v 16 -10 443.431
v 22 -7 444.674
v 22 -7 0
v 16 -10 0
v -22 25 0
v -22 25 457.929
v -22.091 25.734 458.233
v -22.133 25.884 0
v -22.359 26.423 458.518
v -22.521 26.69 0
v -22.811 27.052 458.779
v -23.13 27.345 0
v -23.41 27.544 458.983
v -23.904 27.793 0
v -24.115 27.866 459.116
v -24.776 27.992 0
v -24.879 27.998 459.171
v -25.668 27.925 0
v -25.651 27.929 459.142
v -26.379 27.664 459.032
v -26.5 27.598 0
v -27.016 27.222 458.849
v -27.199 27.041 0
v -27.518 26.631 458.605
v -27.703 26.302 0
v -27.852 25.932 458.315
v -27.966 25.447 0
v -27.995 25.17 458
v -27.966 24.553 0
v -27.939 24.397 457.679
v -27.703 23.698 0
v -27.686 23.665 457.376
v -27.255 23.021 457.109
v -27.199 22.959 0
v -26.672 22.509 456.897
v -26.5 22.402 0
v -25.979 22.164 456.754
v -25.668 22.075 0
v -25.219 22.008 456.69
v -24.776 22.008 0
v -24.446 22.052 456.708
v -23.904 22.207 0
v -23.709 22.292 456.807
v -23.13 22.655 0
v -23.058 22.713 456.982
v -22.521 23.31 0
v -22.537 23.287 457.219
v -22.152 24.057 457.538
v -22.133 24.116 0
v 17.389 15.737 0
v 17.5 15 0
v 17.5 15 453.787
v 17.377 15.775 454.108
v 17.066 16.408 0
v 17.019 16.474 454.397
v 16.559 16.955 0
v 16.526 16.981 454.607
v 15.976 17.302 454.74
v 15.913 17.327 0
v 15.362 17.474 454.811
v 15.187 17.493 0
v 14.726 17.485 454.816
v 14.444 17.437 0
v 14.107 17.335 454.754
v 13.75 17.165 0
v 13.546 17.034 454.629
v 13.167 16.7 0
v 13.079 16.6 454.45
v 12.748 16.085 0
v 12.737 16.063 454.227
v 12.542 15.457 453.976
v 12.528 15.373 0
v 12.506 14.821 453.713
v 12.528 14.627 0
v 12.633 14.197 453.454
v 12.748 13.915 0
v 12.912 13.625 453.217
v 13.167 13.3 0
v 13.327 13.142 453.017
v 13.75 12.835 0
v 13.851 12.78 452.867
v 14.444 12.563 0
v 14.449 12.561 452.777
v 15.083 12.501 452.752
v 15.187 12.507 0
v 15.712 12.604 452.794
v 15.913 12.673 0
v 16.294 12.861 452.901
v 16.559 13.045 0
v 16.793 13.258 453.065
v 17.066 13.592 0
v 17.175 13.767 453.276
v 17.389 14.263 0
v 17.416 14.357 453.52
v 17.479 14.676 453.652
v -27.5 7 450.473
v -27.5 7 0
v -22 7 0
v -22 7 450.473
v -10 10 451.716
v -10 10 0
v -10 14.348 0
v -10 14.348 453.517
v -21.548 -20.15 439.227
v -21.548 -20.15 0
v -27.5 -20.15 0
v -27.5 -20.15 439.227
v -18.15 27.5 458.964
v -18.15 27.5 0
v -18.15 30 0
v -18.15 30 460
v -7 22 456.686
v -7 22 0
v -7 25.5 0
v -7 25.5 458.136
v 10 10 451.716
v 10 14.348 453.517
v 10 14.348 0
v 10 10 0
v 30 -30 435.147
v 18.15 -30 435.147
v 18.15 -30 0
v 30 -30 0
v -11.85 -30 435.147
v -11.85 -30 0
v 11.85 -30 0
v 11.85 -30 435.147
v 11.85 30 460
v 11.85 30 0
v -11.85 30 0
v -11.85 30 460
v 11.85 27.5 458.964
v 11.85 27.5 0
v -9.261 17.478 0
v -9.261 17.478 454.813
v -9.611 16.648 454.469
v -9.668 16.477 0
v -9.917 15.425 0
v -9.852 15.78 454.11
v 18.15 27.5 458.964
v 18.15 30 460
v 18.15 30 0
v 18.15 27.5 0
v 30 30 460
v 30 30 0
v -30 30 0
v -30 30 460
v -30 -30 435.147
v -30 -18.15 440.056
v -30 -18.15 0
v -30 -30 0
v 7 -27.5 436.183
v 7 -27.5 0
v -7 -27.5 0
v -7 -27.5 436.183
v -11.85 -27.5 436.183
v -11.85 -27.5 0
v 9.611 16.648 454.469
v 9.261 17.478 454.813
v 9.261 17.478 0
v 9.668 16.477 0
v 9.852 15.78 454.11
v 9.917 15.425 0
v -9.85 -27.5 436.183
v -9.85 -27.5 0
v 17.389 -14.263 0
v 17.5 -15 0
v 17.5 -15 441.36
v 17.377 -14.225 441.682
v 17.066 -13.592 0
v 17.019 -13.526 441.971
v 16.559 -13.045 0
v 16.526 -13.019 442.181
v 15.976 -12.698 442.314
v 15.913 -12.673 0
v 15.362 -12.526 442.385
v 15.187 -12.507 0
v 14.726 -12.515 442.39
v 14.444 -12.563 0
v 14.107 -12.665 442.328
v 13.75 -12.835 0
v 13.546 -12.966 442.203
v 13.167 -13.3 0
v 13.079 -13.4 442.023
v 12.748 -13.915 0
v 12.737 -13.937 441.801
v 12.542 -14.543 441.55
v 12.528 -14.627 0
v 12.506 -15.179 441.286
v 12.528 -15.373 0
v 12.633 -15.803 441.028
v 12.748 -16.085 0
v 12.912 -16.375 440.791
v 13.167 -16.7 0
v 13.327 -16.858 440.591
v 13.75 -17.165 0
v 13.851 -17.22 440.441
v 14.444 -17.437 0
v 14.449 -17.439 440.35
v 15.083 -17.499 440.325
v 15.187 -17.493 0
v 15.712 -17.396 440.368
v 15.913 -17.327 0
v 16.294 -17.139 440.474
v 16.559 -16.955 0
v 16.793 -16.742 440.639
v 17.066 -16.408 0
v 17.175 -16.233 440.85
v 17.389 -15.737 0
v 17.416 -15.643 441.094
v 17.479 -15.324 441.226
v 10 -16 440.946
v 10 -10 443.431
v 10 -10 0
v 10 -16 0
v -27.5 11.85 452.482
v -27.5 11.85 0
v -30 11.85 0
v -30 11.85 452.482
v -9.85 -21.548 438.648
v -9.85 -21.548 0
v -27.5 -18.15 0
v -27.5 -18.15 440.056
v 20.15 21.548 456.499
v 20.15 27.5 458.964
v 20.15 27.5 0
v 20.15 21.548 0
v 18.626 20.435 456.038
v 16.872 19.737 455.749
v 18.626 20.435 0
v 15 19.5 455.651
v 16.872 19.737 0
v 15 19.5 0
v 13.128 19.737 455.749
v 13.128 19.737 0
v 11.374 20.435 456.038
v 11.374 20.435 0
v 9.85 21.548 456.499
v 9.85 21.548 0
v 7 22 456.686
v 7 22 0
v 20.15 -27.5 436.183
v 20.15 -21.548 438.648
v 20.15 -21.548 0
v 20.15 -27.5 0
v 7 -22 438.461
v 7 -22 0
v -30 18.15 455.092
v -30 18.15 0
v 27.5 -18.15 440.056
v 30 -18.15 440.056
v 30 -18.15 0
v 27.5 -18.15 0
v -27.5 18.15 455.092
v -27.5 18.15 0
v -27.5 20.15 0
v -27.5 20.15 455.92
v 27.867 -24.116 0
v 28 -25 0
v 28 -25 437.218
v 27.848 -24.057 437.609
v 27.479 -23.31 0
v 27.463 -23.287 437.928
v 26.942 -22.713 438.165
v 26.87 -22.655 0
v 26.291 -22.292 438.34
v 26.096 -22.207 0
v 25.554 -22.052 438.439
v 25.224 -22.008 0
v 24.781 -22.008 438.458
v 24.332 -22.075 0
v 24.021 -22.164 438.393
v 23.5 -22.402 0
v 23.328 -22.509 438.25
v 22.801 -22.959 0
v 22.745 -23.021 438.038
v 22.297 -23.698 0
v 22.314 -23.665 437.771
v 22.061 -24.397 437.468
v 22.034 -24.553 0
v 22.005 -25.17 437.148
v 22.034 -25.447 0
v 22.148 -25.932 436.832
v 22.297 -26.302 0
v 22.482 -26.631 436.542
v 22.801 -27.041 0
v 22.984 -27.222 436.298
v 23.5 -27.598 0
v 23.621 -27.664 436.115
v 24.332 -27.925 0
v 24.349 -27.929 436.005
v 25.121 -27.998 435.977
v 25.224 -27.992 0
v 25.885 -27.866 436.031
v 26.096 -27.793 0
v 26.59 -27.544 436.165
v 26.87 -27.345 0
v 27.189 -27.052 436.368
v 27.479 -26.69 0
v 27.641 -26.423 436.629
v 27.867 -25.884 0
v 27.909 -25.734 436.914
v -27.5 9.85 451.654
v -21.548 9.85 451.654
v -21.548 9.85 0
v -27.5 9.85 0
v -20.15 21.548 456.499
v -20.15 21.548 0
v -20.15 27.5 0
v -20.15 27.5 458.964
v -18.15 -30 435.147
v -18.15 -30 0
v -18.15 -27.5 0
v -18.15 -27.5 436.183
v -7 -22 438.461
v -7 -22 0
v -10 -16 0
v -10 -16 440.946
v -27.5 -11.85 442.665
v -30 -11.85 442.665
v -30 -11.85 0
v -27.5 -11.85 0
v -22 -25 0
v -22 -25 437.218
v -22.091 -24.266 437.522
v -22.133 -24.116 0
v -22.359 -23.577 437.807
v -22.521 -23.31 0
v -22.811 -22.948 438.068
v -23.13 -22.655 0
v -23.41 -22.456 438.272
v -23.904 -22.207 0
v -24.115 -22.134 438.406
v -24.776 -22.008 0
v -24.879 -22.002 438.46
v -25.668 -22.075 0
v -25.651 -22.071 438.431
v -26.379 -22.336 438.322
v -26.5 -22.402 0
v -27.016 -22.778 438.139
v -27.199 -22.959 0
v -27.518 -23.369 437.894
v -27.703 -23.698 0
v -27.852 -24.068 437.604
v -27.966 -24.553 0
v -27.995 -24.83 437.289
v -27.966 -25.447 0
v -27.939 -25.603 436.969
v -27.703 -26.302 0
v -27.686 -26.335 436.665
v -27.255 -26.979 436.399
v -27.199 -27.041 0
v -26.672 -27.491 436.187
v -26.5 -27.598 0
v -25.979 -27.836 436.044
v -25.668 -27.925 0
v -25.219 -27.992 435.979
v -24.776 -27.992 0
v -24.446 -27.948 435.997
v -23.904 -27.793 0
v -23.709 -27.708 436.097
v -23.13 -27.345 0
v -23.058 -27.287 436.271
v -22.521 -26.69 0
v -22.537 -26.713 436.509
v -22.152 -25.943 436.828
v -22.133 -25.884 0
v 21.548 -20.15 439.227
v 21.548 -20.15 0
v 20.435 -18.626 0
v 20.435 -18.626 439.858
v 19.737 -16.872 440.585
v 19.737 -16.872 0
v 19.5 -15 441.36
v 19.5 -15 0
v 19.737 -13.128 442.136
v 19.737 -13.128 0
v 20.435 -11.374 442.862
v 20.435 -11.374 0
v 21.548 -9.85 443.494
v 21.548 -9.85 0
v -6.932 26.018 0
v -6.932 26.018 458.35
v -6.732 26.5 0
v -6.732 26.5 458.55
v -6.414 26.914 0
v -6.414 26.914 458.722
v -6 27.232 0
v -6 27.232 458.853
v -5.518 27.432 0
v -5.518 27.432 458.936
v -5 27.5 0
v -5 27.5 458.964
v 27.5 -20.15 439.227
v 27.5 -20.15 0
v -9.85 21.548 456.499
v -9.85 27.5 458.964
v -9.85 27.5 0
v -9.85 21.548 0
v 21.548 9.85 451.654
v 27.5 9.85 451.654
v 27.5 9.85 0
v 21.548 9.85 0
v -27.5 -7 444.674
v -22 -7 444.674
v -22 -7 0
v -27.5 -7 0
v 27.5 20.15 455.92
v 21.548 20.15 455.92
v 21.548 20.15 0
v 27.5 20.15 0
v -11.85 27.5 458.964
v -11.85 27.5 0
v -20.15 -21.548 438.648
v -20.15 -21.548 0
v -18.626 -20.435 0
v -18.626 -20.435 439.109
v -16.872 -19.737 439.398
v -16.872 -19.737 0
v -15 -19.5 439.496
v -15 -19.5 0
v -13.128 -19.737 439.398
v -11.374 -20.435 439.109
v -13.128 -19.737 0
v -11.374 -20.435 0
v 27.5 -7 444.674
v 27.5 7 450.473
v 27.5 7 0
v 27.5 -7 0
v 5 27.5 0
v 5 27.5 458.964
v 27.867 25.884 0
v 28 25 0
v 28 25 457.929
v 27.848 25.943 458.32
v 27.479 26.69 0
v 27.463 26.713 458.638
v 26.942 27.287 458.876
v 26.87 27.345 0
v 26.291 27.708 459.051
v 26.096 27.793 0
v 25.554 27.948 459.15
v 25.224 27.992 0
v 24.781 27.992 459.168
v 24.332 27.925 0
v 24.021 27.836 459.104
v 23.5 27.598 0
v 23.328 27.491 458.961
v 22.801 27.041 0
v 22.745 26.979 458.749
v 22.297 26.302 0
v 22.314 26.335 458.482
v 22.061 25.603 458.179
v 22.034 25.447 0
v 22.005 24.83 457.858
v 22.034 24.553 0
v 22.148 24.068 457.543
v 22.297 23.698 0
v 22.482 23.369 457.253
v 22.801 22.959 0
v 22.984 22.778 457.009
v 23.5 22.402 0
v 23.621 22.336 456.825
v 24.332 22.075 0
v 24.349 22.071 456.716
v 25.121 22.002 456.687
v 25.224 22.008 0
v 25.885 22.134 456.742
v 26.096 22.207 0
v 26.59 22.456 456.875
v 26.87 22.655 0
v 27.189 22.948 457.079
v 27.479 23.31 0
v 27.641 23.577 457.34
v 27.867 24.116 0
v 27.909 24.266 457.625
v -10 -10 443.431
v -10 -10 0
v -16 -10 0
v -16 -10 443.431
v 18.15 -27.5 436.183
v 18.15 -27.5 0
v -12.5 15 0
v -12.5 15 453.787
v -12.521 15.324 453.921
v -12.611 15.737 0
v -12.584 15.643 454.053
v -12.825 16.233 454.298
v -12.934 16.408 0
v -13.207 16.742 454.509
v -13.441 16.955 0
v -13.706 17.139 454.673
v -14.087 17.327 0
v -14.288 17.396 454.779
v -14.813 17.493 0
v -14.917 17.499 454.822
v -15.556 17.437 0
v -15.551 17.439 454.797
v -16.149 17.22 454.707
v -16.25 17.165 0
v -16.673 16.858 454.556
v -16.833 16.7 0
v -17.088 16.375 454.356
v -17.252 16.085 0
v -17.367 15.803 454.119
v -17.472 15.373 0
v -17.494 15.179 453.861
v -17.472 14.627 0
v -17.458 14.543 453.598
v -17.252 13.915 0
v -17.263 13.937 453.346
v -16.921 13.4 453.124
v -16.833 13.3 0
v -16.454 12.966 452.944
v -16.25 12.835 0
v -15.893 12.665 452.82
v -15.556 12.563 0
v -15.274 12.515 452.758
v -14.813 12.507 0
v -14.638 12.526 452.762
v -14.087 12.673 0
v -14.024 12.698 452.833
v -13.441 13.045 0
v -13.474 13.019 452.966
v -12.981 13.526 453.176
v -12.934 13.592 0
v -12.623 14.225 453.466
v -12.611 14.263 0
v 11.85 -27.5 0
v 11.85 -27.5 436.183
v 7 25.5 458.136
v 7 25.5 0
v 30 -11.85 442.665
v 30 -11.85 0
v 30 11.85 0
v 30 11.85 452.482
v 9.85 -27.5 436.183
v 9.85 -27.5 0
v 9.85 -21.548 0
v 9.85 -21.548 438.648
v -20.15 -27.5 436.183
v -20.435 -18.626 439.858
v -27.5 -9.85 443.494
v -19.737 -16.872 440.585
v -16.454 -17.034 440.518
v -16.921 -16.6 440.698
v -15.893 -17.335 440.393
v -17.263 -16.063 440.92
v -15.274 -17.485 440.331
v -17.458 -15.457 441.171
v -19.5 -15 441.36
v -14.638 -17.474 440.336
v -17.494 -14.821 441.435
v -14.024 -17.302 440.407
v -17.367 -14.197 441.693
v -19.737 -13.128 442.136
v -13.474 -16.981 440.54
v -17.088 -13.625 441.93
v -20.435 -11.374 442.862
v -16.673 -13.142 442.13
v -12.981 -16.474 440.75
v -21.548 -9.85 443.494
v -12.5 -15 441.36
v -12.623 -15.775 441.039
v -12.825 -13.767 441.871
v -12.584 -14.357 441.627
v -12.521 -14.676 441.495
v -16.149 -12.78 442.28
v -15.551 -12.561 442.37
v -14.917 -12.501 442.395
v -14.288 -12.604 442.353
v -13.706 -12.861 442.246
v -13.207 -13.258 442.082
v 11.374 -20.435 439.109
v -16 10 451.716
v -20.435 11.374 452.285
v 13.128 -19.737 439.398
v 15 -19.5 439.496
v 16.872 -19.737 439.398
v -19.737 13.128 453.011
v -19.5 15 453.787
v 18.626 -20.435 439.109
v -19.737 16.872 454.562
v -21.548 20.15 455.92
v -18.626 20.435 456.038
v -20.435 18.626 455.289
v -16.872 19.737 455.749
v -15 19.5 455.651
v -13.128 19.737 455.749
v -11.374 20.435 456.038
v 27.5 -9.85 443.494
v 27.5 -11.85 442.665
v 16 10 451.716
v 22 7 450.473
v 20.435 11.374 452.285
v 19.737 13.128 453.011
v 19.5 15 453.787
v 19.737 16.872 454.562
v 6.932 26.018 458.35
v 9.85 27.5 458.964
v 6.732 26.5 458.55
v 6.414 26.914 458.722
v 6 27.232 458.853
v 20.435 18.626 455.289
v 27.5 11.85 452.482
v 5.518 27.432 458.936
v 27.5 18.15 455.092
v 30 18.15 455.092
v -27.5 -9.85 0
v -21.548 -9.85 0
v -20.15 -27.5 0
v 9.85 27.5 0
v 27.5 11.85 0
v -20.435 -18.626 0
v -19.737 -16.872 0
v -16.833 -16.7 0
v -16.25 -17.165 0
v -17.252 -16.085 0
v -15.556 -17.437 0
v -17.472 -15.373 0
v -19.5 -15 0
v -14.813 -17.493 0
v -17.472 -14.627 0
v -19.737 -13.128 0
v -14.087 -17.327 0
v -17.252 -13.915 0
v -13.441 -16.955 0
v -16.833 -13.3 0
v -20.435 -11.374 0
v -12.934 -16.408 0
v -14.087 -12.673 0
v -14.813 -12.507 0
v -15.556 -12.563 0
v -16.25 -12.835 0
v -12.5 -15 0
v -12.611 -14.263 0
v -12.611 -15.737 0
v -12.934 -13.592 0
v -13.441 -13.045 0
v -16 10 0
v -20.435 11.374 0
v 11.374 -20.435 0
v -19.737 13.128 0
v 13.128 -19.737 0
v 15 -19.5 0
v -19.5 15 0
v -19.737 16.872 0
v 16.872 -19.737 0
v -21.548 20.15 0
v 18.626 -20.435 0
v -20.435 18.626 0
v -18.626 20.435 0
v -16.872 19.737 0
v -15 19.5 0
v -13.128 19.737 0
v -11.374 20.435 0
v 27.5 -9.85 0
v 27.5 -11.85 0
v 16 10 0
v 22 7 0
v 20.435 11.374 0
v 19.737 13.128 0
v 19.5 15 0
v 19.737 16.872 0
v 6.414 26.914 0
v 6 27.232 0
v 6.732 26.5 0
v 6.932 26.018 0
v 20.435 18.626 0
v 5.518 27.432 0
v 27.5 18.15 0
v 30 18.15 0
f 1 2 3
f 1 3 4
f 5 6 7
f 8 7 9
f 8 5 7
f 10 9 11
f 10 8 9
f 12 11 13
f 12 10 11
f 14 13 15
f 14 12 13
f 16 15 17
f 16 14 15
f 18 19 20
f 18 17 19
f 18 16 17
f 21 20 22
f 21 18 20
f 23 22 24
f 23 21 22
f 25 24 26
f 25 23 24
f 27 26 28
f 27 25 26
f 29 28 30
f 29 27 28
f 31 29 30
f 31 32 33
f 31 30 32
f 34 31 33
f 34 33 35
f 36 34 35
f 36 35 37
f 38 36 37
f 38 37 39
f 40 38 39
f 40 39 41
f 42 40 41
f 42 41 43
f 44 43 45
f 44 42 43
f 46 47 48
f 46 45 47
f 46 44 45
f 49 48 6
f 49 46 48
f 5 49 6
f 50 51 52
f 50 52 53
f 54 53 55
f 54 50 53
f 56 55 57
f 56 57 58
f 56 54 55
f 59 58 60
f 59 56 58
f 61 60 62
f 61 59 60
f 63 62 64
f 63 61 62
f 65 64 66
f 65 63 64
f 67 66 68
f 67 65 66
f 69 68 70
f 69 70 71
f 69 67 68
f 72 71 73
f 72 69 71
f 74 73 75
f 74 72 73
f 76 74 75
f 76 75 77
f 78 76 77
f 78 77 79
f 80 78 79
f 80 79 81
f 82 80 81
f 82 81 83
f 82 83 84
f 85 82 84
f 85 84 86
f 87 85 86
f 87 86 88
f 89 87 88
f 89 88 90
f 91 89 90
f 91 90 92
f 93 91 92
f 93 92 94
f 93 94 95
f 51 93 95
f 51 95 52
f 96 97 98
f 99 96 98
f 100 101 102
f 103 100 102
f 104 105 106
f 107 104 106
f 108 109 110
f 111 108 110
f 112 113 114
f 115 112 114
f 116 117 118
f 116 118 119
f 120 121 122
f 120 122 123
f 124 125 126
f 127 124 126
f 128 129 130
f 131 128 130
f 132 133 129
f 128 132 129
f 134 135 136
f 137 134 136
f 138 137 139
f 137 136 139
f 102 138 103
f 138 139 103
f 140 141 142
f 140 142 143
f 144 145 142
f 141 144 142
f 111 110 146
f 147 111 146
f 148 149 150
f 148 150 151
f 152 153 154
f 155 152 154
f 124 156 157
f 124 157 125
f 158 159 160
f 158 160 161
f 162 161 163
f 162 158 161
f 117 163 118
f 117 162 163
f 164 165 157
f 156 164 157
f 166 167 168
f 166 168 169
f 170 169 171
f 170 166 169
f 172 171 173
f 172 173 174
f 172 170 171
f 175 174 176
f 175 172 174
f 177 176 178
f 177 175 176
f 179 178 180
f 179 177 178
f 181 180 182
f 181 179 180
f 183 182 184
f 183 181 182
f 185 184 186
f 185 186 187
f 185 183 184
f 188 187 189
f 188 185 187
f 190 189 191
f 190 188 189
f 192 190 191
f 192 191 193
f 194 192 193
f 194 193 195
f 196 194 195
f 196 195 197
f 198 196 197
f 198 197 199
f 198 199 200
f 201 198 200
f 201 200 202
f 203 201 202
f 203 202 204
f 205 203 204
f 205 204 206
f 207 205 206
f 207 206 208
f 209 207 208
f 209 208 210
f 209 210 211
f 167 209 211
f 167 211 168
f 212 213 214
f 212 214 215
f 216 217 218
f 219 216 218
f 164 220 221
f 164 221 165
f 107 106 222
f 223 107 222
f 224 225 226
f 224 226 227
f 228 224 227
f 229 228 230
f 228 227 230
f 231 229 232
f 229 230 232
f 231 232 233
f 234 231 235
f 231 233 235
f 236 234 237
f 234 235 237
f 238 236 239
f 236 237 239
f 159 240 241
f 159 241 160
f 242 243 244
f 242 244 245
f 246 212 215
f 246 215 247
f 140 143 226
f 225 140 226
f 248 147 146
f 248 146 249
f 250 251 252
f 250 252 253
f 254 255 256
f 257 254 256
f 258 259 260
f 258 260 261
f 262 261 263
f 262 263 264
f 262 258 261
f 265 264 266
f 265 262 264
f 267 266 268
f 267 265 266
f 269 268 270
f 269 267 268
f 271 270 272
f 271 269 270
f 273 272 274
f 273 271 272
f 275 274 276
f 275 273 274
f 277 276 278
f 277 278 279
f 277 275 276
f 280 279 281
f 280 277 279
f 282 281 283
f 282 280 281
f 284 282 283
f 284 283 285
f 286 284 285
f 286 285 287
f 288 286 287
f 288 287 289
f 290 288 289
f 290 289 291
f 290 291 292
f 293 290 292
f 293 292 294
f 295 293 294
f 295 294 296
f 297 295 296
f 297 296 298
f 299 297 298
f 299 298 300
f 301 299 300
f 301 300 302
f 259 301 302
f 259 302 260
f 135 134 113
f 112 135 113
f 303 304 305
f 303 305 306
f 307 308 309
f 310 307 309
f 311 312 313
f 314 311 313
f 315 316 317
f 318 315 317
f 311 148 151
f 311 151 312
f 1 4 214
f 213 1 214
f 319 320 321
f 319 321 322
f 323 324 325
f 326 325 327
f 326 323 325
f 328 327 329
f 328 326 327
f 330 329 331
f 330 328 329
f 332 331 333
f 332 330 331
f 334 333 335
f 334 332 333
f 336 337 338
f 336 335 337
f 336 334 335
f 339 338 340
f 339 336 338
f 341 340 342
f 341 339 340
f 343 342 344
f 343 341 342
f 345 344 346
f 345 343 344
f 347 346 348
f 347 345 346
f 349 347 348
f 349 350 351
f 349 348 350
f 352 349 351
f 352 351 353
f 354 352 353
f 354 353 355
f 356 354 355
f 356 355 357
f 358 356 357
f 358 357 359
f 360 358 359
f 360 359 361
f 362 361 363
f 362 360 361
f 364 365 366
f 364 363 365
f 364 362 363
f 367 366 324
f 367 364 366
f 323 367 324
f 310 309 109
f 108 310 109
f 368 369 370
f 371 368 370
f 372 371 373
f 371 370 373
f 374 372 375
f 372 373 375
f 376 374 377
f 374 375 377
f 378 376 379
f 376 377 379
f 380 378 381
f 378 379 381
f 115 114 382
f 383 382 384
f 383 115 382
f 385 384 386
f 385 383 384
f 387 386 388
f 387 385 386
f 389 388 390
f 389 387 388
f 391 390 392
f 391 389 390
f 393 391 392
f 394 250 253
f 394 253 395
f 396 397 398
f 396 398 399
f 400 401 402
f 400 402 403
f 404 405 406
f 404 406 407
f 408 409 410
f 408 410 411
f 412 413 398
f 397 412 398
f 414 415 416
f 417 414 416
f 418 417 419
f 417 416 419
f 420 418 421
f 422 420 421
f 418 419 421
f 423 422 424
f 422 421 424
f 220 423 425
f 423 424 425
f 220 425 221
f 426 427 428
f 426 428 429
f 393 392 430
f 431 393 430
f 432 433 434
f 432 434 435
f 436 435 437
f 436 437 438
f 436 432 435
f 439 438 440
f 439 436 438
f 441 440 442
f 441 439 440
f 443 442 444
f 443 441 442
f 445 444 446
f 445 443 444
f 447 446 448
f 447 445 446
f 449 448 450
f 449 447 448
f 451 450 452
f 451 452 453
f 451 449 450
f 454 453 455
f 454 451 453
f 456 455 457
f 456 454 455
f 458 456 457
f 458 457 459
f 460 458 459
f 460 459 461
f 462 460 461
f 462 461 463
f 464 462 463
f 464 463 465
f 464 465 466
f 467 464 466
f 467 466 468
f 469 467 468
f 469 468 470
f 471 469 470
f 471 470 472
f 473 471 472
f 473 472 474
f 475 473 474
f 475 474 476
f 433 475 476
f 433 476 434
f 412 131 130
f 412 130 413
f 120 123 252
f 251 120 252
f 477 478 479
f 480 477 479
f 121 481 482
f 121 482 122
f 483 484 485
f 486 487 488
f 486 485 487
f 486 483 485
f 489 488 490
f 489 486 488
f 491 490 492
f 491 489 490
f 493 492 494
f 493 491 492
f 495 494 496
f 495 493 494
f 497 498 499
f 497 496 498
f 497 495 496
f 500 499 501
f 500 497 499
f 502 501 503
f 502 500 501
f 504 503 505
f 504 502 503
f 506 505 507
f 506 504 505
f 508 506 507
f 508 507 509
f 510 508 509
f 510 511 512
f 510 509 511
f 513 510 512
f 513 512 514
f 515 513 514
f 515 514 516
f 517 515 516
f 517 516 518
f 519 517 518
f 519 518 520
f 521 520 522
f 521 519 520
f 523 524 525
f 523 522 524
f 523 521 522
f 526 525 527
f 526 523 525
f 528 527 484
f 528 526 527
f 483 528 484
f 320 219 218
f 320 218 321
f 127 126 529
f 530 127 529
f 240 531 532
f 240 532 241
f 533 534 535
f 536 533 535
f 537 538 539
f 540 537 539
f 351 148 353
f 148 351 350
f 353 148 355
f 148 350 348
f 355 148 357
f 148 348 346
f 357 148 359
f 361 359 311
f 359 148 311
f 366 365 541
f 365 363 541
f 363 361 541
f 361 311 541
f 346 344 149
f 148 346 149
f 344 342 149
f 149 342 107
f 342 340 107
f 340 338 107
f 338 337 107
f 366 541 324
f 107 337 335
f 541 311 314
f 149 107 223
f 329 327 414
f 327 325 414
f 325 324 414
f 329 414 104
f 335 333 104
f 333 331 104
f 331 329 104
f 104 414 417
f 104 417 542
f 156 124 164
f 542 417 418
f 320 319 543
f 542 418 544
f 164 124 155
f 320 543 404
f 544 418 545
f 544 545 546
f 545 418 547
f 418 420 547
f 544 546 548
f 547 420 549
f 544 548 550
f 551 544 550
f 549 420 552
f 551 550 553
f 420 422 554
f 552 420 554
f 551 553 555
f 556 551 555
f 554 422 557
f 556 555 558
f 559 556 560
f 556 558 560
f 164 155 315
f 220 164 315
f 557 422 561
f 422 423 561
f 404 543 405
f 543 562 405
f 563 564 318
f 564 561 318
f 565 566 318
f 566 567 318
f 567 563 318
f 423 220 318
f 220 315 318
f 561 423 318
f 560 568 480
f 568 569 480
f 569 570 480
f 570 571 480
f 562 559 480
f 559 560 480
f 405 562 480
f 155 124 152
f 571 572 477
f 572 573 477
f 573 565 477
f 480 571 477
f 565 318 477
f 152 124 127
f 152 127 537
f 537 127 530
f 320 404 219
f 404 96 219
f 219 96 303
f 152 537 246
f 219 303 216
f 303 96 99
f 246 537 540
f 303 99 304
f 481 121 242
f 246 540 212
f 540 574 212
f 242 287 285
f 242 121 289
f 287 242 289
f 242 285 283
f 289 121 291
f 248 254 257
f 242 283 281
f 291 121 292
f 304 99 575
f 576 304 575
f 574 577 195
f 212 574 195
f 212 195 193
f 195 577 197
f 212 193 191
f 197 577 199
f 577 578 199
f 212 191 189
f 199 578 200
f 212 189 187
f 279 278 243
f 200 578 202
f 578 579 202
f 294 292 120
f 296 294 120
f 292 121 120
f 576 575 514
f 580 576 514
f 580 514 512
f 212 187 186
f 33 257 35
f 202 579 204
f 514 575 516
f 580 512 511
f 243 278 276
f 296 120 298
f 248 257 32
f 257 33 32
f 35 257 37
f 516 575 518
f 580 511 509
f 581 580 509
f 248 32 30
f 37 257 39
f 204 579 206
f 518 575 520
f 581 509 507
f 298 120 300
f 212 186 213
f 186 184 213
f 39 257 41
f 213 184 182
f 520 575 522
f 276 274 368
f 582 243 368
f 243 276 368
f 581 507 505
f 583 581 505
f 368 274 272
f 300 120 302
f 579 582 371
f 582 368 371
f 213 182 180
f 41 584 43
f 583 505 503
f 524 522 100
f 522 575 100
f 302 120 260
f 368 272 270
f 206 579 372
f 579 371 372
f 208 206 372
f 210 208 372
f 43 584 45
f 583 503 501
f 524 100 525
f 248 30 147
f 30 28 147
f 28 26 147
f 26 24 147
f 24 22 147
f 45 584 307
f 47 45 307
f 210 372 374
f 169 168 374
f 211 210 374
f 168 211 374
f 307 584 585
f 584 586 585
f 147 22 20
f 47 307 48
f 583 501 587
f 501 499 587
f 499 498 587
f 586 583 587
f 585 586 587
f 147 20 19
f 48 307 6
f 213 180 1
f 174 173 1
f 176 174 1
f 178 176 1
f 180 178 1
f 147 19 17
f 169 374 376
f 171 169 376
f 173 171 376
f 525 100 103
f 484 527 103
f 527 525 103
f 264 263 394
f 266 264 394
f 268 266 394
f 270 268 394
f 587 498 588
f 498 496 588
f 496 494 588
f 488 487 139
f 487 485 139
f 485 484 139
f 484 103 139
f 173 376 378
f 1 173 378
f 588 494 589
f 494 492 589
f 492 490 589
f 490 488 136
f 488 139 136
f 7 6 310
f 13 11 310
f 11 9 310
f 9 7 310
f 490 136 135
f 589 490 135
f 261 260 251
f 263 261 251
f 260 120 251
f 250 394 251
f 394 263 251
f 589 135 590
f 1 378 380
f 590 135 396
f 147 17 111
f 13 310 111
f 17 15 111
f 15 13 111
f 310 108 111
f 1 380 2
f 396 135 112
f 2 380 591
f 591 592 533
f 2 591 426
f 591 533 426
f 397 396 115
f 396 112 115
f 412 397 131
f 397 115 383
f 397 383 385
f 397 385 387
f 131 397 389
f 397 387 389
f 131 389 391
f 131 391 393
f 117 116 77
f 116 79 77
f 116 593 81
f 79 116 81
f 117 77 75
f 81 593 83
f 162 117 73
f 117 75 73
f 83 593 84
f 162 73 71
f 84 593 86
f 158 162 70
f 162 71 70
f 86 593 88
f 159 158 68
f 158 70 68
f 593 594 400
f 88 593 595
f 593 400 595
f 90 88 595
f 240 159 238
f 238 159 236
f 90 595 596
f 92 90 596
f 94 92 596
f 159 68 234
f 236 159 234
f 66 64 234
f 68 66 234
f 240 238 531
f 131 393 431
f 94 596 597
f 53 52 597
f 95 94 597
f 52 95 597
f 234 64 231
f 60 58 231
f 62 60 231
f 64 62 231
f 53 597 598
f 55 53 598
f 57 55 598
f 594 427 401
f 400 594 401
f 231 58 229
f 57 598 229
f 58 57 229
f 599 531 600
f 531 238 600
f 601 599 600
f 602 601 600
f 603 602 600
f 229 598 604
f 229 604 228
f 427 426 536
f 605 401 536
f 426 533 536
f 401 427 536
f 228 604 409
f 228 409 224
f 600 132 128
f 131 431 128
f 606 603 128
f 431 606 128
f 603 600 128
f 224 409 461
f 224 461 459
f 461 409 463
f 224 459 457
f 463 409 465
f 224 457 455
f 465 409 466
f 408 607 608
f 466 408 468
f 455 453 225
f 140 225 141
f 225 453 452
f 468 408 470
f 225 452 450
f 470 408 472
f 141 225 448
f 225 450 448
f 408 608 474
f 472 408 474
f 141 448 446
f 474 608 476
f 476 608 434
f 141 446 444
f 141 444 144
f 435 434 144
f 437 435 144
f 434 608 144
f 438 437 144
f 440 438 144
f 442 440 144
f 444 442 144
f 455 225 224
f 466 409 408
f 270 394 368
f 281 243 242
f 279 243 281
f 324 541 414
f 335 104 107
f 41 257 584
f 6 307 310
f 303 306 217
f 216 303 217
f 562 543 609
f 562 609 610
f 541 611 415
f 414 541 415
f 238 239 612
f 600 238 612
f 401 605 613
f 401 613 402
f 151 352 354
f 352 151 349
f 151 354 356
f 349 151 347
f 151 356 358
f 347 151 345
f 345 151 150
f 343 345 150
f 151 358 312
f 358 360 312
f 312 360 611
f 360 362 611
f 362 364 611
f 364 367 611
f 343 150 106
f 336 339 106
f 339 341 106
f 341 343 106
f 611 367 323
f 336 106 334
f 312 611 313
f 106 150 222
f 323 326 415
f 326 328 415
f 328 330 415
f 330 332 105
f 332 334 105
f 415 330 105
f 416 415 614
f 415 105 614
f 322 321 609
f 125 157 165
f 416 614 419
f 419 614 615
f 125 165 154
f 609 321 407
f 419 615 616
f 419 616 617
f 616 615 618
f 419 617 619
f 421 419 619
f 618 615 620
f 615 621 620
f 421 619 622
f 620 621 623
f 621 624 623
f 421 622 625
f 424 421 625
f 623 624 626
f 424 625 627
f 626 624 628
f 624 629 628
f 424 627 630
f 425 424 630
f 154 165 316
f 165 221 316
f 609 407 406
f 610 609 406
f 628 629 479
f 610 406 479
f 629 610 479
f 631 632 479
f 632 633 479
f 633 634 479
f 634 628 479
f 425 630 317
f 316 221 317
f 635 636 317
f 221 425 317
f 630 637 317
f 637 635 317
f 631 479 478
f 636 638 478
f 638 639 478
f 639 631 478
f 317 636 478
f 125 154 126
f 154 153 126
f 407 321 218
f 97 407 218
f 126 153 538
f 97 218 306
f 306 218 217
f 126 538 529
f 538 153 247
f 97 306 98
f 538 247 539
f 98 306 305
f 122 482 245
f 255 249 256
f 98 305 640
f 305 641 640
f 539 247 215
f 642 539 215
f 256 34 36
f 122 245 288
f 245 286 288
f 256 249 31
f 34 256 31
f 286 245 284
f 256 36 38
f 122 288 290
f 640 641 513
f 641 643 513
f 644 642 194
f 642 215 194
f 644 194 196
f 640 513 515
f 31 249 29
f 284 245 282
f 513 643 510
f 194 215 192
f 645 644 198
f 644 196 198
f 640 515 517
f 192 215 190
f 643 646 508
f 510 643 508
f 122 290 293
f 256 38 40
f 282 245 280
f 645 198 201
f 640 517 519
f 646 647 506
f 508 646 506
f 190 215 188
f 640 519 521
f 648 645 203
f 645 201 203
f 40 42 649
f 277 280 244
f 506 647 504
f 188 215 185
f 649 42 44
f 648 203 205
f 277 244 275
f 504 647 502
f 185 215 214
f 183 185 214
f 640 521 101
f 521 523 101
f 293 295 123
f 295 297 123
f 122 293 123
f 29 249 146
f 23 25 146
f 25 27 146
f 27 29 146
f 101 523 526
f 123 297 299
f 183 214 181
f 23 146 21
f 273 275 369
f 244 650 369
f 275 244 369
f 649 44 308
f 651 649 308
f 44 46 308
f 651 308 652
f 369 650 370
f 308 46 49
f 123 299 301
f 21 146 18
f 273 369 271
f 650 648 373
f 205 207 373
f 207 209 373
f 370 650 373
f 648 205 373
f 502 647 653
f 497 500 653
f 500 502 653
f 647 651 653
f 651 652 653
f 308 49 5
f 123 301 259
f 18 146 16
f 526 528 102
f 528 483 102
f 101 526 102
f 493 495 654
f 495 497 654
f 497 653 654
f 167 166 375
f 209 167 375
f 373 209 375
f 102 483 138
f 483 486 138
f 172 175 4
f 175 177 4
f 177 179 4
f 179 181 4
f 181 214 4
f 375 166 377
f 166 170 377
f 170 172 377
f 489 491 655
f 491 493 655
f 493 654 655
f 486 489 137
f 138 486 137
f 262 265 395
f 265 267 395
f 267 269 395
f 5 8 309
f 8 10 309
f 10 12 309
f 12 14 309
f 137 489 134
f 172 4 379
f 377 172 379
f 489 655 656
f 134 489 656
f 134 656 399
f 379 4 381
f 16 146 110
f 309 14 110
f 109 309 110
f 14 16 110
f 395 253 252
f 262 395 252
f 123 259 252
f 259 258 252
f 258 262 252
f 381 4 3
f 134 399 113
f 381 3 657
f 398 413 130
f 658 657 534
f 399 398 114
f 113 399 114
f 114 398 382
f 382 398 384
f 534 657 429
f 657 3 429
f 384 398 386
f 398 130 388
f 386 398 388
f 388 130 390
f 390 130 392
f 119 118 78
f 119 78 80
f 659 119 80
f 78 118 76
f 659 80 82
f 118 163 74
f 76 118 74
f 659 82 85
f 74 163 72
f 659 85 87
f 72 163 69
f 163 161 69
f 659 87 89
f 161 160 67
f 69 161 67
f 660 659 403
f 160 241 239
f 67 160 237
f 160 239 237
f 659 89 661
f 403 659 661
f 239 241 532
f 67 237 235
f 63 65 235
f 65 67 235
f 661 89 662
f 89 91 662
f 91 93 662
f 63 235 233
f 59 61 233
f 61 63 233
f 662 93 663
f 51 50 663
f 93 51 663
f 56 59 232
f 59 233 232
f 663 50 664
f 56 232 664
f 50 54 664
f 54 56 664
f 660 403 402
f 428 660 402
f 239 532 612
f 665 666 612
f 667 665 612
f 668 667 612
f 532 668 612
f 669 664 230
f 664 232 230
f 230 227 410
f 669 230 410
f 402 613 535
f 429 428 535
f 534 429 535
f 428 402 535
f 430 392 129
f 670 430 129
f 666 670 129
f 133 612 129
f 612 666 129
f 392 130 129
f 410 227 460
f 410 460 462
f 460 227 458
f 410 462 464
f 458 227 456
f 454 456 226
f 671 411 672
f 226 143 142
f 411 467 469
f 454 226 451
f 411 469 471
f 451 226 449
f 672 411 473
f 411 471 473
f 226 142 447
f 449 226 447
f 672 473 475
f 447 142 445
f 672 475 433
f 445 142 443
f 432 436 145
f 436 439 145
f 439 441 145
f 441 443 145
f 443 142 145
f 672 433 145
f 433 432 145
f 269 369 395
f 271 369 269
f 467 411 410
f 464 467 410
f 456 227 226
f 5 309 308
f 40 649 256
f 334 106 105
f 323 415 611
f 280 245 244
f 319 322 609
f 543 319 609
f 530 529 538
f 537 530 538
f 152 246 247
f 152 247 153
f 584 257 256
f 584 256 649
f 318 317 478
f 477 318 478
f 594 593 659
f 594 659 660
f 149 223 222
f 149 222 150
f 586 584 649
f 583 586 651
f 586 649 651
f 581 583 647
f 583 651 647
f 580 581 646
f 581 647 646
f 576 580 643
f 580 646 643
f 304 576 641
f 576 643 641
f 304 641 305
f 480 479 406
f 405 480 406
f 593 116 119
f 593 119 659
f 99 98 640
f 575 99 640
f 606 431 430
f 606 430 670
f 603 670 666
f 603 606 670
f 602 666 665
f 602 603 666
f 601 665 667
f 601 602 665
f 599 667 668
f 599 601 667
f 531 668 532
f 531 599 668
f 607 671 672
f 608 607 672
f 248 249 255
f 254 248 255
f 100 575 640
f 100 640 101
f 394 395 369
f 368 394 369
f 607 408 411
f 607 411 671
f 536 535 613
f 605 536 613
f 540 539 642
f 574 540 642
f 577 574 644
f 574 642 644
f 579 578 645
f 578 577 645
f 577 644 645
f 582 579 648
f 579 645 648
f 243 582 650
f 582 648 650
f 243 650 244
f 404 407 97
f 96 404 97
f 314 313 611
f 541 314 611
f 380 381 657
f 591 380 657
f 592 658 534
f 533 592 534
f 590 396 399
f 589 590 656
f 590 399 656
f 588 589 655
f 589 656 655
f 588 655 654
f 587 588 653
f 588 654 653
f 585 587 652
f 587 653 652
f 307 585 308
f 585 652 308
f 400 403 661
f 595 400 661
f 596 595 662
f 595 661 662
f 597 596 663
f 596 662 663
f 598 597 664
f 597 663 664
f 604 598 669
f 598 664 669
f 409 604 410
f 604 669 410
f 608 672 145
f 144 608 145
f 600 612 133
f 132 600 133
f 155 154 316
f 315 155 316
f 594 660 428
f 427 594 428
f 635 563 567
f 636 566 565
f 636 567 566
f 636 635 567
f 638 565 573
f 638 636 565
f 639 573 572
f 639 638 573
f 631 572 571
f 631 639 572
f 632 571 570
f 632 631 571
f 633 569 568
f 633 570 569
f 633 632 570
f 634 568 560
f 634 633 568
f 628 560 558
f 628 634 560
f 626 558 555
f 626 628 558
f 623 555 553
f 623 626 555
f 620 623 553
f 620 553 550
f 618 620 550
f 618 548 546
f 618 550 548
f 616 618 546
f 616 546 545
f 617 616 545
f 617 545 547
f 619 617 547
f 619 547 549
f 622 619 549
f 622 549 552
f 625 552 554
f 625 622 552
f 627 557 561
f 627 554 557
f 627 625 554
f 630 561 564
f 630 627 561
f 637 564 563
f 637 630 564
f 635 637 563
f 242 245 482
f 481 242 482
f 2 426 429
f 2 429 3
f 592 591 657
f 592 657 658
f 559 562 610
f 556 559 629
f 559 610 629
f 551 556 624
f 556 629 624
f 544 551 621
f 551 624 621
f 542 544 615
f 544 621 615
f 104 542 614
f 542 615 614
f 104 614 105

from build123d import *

# Parameters (mm, degrees)
F0_R          = 3
F0_R_2        = 2.5
F1_DEPTH      = 460
F2_R          = 2
F3_R          = 7
F5_DEPTH      = 30
F5_DEPTH_BACK = 30


# Not quite as in the source:
# - a feature names something its author has since deleted; it is built from what else it names


with BuildPart() as f1:
    # F0 (on Top) → F1 (new body)
    with BuildSketch(Plane.XY):
        with BuildLine():
            Line((18.15, -30), (30, -30))
            Line((30, -30), (30, -18.15))
            Line((30, -18.15), (27.5, -18.15))
            Line((27.5, -18.15), (27.5, -20.15))
            Line((27.5, -20.15), (21.5477069044, -20.15))
            ThreePointArc((21.5477069044, -20.15), (19.5, -15), (21.5477069044, -9.85))
            Line((21.5477069044, -9.85), (27.5, -9.85))
            Line((27.5, -9.85), (27.5, -11.85))
            Line((27.5, -11.85), (30, -11.85))
            Line((30, -11.85), (30, 11.85))
            Line((30, 11.85), (27.5, 11.85))
            Line((27.5, 11.85), (27.5, 9.85))
            Line((27.5, 9.85), (21.5477069044, 9.85))
            ThreePointArc((21.5477069044, 9.85), (19.5, 15), (21.5477069044, 20.15))
            Line((21.5477069044, 20.15), (27.5, 20.15))
            Line((27.5, 20.15), (27.5, 18.15))
            Line((27.5, 18.15), (30, 18.15))
            Line((30, 18.15), (30, 30))
            Line((30, 30), (18.15, 30))
            Line((18.15, 30), (18.15, 27.5))
            Line((18.15, 27.5), (20.15, 27.5))
            Line((20.15, 27.5), (20.15, 21.5477069044))
            ThreePointArc((20.15, 21.5477069044), (15, 19.5), (9.85, 21.5477069044))
            Line((9.85, 21.5477069044), (9.85, 27.5))
            Line((9.85, 27.5), (11.85, 27.5))
            Line((11.85, 27.5), (11.85, 30))
            Line((11.85, 30), (-11.85, 30))
            Line((-11.85, 30), (-11.85, 27.5))
            Line((-11.85, 27.5), (-9.85, 27.5))
            Line((-9.85, 27.5), (-9.85, 21.5477069044))
            ThreePointArc((-9.85, 21.5477069044), (-15, 19.5), (-20.15, 21.5477069044))
            Line((-20.15, 21.5477069044), (-20.15, 27.5))
            Line((-20.15, 27.5), (-18.15, 27.5))
            Line((-18.15, 27.5), (-18.15, 30))
            Line((-18.15, 30), (-30, 30))
            Line((-30, 30), (-30, 18.15))
            Line((-30, 18.15), (-27.5, 18.15))
            Line((-27.5, 18.15), (-27.5, 20.15))
            Line((-27.5, 20.15), (-21.5477069044, 20.15))
            ThreePointArc((-21.5477069044, 20.15), (-19.5, 15), (-21.5477069044, 9.85))
            Line((-21.5477069044, 9.85), (-27.5, 9.85))
            Line((-27.5, 9.85), (-27.5, 11.85))
            Line((-27.5, 11.85), (-30, 11.85))
            Line((-30, 11.85), (-30, -11.85))
            Line((-30, -11.85), (-27.5, -11.85))
            Line((-27.5, -11.85), (-27.5, -9.85))
            Line((-27.5, -9.85), (-21.5477069044, -9.85))
            ThreePointArc((-21.5477069044, -9.85), (-19.5, -15), (-21.5477069044, -20.15))
            Line((-21.5477069044, -20.15), (-27.5, -20.15))
            Line((-27.5, -20.15), (-27.5, -18.15))
            Line((-27.5, -18.15), (-30, -18.15))
            Line((-30, -18.15), (-30, -30))
            Line((-30, -30), (-18.15, -30))
            Line((-18.15, -30), (-18.15, -27.5))
            Line((-18.15, -27.5), (-20.15, -27.5))
            Line((-20.15, -27.5), (-20.15, -21.5477069044))
            ThreePointArc((-20.15, -21.5477069044), (-15, -19.5), (-9.85, -21.5477069044))
            Line((-9.85, -21.5477069044), (-9.85, -27.5))
            Line((-9.85, -27.5), (-11.85, -27.5))
            Line((-11.85, -27.5), (-11.85, -30))
            Line((-11.85, -30), (11.85, -30))
            Line((11.85, -30), (11.85, -27.5))
            Line((11.85, -27.5), (9.85, -27.5))
            Line((9.85, -27.5), (9.85, -21.5477069044))
            ThreePointArc((9.85, -21.5477069044), (15, -19.5), (20.15, -21.5477069044))
            Line((20.15, -21.5477069044), (20.15, -27.5))
            Line((20.15, -27.5), (18.15, -27.5))
            Line((18.15, -27.5), (18.15, -30))
        make_face()
        with Locations((-25, -25)):
            Circle(F0_R, mode=Mode.SUBTRACT)
        with Locations((-15, -15)):
            Circle(F0_R_2, mode=Mode.SUBTRACT)
        with Locations((25, -25)):
            Circle(F0_R, mode=Mode.SUBTRACT)
        with Locations((15, -15)):
            Circle(F0_R_2, mode=Mode.SUBTRACT)
        with Locations((-25, 25)):
            Circle(F0_R, mode=Mode.SUBTRACT)
        with Locations((-15, 15)):
            Circle(F0_R_2, mode=Mode.SUBTRACT)
        Polygon((-7, 22), (-7, 27.5), (0, 27.5), (7, 27.5), (7, 22), (10, 16), (10, 10), (16, 10), (22, 7), (27.5, 7), (27.5, 0), (27.5, -7), (22, -7), (16, -10), (10, -10), (10, -16), (7, -22), (7, -27.5), (0, -27.5), (-7, -27.5), (-7, -22), (-10, -16), (-10, -10), (-16, -10), (-22, -7), (-27.5, -7), (-27.5, 0), (-27.5, 7), (-22, 7), (-16, 10), (-10, 10), (-10, 16), align=None, mode=Mode.SUBTRACT)
        with Locations((15, 15)):
            Circle(F0_R_2, mode=Mode.SUBTRACT)
        with Locations((25, 25)):
            Circle(F0_R, mode=Mode.SUBTRACT)
    extrude(amount=F1_DEPTH)

    # F2
    f2_edges = [f1.edges().sort_by_distance(p)[0] for p in [
        (-7, 27.5, 230),
        (7, 27.5, 230),
    ]]
    fillet(f2_edges, radius=F2_R)

    # F3
    f3_edges = [f1.edges().sort_by_distance(p)[0] for p in [
        (-10, 16, 230),
        (10, 16, 230),
    ]]
    fillet(f3_edges, radius=F3_R)

    # F4 (on Right) → F5 (cut, two sides)
    with BuildSketch(Plane.YZ) as f5_sk:
        Polygon((30, 460), (-101.7983138763, 778.1892768581), (-315.3200388241, 689.7456825234), (-183.5217249478, 371.5564056653), align=None)
    extrude(amount=F5_DEPTH, mode=Mode.SUBTRACT)
    extrude(f5_sk.sketch, amount=-F5_DEPTH_BACK, mode=Mode.SUBTRACT)


solid = f1.part
